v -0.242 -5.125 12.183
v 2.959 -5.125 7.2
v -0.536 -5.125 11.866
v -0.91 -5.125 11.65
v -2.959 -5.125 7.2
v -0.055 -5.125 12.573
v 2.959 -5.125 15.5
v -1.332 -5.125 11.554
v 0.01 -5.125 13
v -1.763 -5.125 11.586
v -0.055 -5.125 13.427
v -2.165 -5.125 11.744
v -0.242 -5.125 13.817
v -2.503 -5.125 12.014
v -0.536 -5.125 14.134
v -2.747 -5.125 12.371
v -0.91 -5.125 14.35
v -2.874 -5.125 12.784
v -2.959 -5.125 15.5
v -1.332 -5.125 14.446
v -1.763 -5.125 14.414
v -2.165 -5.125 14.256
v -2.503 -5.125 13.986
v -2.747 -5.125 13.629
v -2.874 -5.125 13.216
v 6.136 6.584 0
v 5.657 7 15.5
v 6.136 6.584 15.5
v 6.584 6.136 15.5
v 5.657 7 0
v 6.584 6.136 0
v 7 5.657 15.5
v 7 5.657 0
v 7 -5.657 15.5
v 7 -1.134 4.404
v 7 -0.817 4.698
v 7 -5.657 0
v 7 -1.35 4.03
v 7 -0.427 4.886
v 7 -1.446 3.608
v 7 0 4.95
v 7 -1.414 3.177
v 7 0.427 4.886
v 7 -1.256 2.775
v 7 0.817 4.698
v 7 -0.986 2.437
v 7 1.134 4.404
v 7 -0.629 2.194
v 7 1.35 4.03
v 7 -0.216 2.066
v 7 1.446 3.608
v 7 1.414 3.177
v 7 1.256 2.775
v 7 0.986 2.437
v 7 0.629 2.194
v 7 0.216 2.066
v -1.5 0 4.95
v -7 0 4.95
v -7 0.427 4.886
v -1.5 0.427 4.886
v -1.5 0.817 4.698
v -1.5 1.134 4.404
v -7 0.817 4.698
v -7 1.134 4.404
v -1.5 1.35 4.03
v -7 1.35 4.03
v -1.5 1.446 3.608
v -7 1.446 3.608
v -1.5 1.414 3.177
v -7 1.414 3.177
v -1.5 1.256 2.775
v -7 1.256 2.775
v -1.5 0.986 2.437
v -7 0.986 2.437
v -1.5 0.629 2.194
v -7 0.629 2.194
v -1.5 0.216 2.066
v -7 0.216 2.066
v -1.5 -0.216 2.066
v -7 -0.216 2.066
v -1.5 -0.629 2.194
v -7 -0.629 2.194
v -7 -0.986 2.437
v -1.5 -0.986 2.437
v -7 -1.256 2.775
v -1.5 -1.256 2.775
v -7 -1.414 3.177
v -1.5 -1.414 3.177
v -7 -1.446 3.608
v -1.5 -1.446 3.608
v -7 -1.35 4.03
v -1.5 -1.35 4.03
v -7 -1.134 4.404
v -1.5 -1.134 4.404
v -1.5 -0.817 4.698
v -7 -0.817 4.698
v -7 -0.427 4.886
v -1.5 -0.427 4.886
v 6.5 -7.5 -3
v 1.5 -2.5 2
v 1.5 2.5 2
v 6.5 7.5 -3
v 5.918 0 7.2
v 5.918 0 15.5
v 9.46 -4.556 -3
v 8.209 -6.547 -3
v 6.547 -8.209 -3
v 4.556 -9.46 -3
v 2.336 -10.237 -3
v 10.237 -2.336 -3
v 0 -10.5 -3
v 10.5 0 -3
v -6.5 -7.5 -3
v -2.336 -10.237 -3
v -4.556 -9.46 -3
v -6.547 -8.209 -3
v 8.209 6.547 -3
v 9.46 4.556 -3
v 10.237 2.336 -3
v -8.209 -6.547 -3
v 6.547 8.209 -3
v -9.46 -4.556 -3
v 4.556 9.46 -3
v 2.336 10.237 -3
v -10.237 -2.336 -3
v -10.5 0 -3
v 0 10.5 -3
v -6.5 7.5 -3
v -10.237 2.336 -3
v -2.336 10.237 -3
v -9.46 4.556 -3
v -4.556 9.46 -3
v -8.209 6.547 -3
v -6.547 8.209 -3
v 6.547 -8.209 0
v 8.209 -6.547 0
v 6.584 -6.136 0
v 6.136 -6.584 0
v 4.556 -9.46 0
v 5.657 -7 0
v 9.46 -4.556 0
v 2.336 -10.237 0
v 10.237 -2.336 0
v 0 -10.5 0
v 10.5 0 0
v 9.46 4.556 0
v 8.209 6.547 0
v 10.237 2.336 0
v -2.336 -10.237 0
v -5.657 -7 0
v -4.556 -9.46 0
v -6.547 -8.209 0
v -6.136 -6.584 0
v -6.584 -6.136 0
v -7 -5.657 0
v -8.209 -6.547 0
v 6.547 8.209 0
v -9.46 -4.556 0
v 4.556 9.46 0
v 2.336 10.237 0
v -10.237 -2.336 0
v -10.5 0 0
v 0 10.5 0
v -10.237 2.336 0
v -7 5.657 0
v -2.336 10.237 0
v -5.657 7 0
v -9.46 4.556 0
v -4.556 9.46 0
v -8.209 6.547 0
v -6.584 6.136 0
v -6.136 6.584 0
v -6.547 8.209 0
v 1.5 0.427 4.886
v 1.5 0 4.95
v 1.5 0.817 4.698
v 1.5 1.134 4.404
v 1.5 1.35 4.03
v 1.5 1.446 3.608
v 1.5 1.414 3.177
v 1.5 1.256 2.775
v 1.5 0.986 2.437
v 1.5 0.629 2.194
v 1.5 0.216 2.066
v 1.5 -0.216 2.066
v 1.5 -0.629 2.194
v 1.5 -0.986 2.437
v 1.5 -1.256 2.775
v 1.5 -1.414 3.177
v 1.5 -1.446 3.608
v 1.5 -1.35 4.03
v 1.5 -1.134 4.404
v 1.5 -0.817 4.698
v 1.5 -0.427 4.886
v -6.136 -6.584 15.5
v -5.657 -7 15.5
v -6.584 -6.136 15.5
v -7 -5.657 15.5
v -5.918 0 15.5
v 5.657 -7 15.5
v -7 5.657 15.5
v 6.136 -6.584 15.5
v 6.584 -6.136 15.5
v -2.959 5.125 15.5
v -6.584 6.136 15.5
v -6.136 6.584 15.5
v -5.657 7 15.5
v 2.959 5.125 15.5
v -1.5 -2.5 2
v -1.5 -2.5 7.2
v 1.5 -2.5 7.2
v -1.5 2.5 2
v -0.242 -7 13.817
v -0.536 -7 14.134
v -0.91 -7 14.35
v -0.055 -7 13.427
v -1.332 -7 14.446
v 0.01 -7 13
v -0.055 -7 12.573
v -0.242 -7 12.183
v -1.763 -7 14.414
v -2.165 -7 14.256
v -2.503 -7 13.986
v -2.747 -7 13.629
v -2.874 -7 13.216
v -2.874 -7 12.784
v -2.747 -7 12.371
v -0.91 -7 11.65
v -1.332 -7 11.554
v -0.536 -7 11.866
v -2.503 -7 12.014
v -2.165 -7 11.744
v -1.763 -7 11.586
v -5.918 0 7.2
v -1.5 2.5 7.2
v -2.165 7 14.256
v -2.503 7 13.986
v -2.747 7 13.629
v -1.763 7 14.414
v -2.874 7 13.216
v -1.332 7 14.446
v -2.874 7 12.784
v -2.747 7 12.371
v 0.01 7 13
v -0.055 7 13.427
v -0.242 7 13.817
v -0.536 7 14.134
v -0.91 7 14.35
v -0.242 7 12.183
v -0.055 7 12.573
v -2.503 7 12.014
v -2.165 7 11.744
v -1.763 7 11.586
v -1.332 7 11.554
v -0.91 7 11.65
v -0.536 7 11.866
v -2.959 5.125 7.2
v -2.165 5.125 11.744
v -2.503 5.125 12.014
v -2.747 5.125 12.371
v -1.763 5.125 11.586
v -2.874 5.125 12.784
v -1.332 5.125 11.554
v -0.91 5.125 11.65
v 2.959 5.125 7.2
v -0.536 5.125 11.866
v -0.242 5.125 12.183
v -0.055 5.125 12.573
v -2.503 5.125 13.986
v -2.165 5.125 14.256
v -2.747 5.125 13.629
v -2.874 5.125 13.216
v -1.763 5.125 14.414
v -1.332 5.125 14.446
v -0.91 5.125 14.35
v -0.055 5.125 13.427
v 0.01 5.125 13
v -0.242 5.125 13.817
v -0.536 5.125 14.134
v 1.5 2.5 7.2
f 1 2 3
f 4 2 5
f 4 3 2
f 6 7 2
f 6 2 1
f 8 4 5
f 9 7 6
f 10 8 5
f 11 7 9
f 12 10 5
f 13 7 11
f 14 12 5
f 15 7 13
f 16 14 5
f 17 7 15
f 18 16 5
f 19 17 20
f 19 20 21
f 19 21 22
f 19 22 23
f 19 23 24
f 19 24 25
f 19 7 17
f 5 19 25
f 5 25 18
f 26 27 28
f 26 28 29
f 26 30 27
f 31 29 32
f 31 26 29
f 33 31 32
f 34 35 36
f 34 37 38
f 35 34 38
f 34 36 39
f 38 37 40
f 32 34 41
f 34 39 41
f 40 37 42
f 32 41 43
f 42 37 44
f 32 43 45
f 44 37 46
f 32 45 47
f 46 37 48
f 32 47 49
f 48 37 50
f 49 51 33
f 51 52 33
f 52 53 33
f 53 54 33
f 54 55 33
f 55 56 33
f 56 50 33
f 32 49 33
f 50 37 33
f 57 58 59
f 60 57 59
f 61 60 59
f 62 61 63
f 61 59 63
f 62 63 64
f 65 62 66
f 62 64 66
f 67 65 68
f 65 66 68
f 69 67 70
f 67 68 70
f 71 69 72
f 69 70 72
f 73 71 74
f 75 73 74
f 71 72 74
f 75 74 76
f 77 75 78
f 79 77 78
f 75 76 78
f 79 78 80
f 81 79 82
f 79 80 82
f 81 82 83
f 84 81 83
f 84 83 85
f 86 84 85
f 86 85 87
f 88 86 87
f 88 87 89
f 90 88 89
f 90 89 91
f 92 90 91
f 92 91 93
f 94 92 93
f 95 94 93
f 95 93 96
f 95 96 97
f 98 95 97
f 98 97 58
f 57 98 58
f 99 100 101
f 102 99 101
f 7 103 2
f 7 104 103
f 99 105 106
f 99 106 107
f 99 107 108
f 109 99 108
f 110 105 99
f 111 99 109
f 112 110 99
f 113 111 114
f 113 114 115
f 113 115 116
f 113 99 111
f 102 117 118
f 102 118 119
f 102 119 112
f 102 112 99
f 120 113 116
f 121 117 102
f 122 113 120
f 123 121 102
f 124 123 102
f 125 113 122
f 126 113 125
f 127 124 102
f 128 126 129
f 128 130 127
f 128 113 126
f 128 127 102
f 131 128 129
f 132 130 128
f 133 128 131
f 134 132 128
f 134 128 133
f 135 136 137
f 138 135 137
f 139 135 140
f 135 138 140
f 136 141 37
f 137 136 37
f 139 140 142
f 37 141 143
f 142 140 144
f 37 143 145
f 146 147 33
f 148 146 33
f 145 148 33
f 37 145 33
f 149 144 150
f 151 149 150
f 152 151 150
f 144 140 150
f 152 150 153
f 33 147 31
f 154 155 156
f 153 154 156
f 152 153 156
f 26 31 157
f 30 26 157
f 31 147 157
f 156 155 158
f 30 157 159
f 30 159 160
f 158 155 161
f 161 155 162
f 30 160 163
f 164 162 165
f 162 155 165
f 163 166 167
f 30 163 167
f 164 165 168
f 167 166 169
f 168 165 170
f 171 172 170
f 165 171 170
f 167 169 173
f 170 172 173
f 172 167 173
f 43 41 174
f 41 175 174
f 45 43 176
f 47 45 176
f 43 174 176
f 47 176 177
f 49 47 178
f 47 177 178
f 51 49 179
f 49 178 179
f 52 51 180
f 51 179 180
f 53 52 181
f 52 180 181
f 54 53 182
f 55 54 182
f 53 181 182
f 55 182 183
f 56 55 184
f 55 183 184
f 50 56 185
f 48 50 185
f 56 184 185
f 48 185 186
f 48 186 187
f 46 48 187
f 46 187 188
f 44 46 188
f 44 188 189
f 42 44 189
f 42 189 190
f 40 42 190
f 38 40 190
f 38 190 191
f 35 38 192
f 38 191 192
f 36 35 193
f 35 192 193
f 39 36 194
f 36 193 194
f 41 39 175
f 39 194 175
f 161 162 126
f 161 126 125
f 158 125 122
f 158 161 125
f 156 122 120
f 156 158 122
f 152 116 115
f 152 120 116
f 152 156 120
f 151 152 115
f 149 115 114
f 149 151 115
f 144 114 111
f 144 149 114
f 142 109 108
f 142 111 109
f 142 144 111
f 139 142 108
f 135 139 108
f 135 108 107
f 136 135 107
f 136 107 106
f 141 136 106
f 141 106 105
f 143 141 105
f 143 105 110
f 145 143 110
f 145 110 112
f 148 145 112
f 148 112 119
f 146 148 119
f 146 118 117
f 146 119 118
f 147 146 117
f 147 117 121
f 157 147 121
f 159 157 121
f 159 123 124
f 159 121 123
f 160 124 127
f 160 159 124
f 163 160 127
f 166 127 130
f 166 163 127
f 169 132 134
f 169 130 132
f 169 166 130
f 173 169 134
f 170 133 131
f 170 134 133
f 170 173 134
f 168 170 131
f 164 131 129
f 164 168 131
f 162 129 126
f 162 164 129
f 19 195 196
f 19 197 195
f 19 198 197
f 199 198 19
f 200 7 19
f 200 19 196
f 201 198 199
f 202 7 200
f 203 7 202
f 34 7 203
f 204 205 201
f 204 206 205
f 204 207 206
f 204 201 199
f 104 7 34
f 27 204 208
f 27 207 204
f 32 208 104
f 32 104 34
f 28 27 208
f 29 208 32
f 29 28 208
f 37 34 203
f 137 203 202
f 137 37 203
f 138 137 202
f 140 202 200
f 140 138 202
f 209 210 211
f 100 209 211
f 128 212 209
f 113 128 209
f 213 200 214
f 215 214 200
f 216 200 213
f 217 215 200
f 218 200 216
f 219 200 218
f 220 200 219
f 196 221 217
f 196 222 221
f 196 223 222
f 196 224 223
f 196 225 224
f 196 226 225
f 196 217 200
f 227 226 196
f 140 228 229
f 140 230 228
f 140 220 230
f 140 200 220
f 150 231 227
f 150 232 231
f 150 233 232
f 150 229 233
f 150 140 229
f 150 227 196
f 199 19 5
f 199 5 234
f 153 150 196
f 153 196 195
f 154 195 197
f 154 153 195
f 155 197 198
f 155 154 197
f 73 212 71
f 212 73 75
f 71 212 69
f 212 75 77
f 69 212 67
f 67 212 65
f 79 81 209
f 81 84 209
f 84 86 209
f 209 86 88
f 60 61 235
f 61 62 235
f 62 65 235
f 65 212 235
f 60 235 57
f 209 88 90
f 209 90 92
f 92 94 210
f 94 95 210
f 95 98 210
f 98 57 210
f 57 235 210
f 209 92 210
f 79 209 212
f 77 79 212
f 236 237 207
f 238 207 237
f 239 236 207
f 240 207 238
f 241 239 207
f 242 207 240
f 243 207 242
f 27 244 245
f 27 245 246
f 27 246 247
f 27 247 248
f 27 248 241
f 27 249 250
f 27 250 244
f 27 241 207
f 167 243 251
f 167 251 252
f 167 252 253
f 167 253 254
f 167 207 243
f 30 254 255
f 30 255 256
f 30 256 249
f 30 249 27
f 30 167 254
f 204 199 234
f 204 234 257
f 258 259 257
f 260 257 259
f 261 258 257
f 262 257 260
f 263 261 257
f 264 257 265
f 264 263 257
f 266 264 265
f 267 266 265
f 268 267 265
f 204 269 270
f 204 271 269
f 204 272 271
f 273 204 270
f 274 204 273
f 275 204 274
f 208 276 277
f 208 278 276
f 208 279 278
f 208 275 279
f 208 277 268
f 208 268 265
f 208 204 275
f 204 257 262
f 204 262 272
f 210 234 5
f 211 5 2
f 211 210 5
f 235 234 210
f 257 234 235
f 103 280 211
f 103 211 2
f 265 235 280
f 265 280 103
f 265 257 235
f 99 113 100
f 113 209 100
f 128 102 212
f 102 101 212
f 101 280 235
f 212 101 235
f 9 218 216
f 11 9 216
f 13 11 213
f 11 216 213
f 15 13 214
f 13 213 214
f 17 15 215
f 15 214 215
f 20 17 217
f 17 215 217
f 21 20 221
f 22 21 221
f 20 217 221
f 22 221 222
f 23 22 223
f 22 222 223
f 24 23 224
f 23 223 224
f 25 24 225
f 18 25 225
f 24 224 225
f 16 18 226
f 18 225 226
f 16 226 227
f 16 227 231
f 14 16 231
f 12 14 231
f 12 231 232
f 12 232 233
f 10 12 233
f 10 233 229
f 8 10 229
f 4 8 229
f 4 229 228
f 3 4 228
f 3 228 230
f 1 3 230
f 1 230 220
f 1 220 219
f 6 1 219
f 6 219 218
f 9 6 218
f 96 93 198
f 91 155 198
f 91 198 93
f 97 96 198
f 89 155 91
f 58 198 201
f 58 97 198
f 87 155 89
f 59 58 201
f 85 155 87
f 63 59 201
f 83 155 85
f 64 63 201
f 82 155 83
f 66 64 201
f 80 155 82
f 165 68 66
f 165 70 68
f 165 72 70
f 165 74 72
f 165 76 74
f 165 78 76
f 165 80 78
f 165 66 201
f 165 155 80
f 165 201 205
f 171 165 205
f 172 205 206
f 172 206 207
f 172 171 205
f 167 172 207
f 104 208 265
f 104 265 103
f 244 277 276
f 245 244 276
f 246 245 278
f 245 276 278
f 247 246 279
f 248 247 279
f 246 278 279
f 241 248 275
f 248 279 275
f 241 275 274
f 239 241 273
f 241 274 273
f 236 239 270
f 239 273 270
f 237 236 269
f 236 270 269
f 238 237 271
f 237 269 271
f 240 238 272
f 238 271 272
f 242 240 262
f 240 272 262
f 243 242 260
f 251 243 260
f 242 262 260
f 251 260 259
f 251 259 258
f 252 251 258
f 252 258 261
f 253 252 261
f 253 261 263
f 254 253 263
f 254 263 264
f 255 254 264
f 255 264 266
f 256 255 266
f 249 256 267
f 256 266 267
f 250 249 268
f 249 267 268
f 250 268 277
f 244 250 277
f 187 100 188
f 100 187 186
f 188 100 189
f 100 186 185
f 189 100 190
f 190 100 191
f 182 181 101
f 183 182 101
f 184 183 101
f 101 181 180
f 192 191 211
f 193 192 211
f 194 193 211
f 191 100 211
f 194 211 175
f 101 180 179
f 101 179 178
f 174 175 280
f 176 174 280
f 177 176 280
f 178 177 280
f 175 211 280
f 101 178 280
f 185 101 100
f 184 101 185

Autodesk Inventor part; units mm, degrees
ref_plane "YZ Plane" through (0, 0, 0) normal (1, 0, 0) x (0, 1, 0)
ref_plane "XZ Plane" through (0, 0, 0) normal (0, 1, 0) x (-1, 0, 0)
ref_plane "XY Plane" through (0, 0, 0) normal (0, 0, 1) x (1, 0, 0)
sketch "Sketch1" plane through (0, 0, 0) normal (0, 0, 1) x (1, 0, 0)
  circle A0 centre (0, 0) radius 9
  line L0 (-0.75, 10) -> (0.75, 10)
  line L1 (0.75, 10) -> (0.75, 0)
  line L2 (0.75, 0) -> (-0.75, 0)
  line L3 (-0.75, 0) -> (-0.75, 10)
  point P0 (-0.75, 8.9687)
  point P1 (0.75, 8.9687)
  dimension "d0" = 18
  dimension "d26" = 0.75
  dimension "d28" = 0
  dimension "d29" = 10
extrude "Extrusion1" add sketch "Sketch1" along normal blind 15.5 contours A0 L3 L2 L1 | L1 L2 L3 A0
sketch "Sketch2" plane through (0, 0, 0) normal (0, 0, -1) x (-1, 0, 0)
  line L0 (-1.5, -2.5) -> (1.5, -2.5)
  line L1 (1.5, -2.5) -> (1.5, 2.5)
  line L2 (1.5, 2.5) -> (-1.5, 2.5)
  line L3 (-1.5, 2.5) -> (-1.5, -2.5)
  point P0 (0, 0)
  dimension "d3" = 3
  dimension "d4" = 5
  dimension "d5" = 2.5
  dimension "d6" = 1.5
extrude "Extrusion2" cut sketch "Sketch2" against normal blind 10
sketch "Sketch3" plane through (0, 0, 15.5) normal (0, 0, 1) x (1, 0, 0)
  circle A0 centre (0, 0) radius 1.6
  dimension "d9" = 3.2
extrude "Extrusion3" [suppressed]
sketch "Sketch4" plane through (0, 0, 0) normal (0, 0, -1) x (-1, 0, 0)
  circle A0 centre (0, 0) radius 4.5
  dimension "d12" = 9
extrude "Extrusion4" [suppressed]
sketch "Sketch10" plane through (0, 0, 15.5) normal (0, 0, 1) x (1, 0, 0)
  line L0 (2.9589, 5.125) -> (5.9178, 0)
  line L1 (5.9178, 0) -> (2.9589, -5.125)
  line L2 (2.9589, -5.125) -> (-2.9589, -5.125)
  line L3 (-2.9589, -5.125) -> (-5.9178, 0)
  line L4 (-5.9178, 0) -> (-2.9589, 5.125)
  line L5 (-2.9589, 5.125) -> (2.9589, 5.125)
  point P0 (0, 0)
  point P1 (0, 0)
  dimension "d145" = 10.25
extrude "Extrusion7" cut sketch "Sketch10" against normal blind 8.3
ref_plane "Work Plane3" through (0, -9, 0) normal (0, -1, 0) x (1, 0, 0)
sketch "Sketch11" plane through (0, -9, 0) normal (0, -1, 0) x (1, 0, 0)
  circle A0 centre (-1.4401, 13) radius 1.45
  line L0 (9, 15.5) -> (-9, 15.5) projected
  point P0 (0, 0)
  dimension "d66" = 2.9
  dimension "d144" = 2.5
extrude "Extrusion8" cut sketch "Sketch11" against normal through all both and the other way through all
ref_plane "Work Plane4" through (-10.5, -2.5, 0) normal (-1, 0, 0) x (0, 0, 1)
sketch "Sketch12" plane through (-10.5, -2.5, 0) normal (-1, 0, 0) x (0, 0, 1)
  circle A0 centre (3.5, 2.5) radius 1.45
  point P0 (0, 2.5)
  dimension "d71" = 2.9
  dimension "d74" = 3.5
extrude "Extrusion9" cut sketch "Sketch12" against normal blind 22
sketch "Sketch13" plane through (0, 0, 0) normal (0, 0, -1) x (-1, 0, 0)
  circle A0 centre (0, 0) radius 9.25
  circle A1 centre (0, 0) radius 4.75
  dimension "d75" = 9.5
  dimension "d78" = 18.5
extrude "Extrusion10" [suppressed]
sketch "Sketch14" plane through (0, 0, -3.7) normal (0, 0, -1) x (-1, 0, 0)
  line L0 (-8, -5) -> (-10, -5)
  line L1 (-10, -5) -> (-10, 5)
  line L2 (-10, 5) -> (-8, 5)
  line L3 (-8, 5) -> (-8, -5)
  line L4 (10, -5) -> (8, -5)
  line L5 (8, -5) -> (8, 5)
  line L6 (8, 5) -> (10, 5)
  line L7 (10, 5) -> (10, -5)
  line L8 (8, 8) -> (-8, 8)
  line L9 (-8, 8) -> (-8, 10)
  line L10 (-8, 10) -> (8, 10)
  line L11 (8, 10) -> (8, 8)
  line L12 (8, -10) -> (-5, -10)
  line L13 (-5, -10) -> (-5, -8)
  line L14 (-5, -8) -> (8, -8)
  line L15 (8, -8) -> (8, -10)
  point P0 (0, 0)
  dimension "d79" = 8
  dimension "d80" = 2
  dimension "d81" = 5
  dimension "d82" = 5
  dimension "d83" = 8
  dimension "d84" = 2
  dimension "d85" = 5
  dimension "d86" = 5
  dimension "d89" = 8
  dimension "d90" = 8
  dimension "d91" = 2
  dimension "d92" = 2
  dimension "d93" = 8
  dimension "d94" = 8
  dimension "d95" = 8
  dimension "d96" = 5
extrude "Extrusion11" [suppressed]
sketch "Sketch15" plane through (0, 0, 0) normal (0, 0, -1) x (-1, 0, 0)
  line L0 (10, -10.5) -> (7, -10.5)
  line L1 (7, -10.5) -> (7, 10.5)
  line L2 (7, 10.5) -> (10, 10.5)
  line L3 (10, 10.5) -> (10, -10.5)
  line L4 (-10, -10.5) -> (-7, -10.5)
  line L5 (-7, -10.5) -> (-7, 10.5)
  line L6 (-7, 10.5) -> (-10, 10.5)
  line L7 (-10, 10.5) -> (-10, -10.5)
  line L8 (-9.5, 10.5) -> (9.5, 10.5)
  line L9 (9.5, 10.5) -> (9.5, 7)
  line L10 (9.5, 7) -> (-9.5, 7)
  line L11 (-9.5, 7) -> (-9.5, 10.5)
  line L12 (-1.5, 2.5) -> (1.5, 2.5) projected
  line L13 (-1.5, -2.5) -> (-1.5, 2.5) projected
  line L14 (1.5, 2.5) -> (1.5, -2.5) projected
  line L15 (1.5, -2.5) -> (-1.5, -2.5) projected
  line L16 (-9.5, -7) -> (9.5, -7)
  line L17 (9.5, -7) -> (9.5, -10.5)
  line L18 (9.5, -10.5) -> (-9.5, -10.5)
  line L19 (-9.5, -10.5) -> (-9.5, -7)
  point P0 (0, 0)
  point P1 (-7, 7)
  point P2 (7, 7)
  point P3 (7, -7)
  point P4 (-7, -7)
  dimension "d101" = 8
  dimension "d102" = 8
  dimension "d103" = 8
  dimension "d106" = 8
  dimension "d107" = 8
  dimension "d109" = 8
  dimension "d110" = 8
  dimension "d111" = 8
  dimension "d113" = 8
  dimension "d114" = 8
  dimension "d115" = 3
  dimension "d118" = 7
  dimension "d119" = 7
  dimension "d120" = 7
  dimension "d121" = 7
  dimension "d146" = 3
extrude "Extrusion12" cut sketch "Sketch15" against normal blind 16.25 contours L0 L17 L16 L1 L10 L9 L2 L3 | L0 L1 L16 L17 | L18 L5 L16 L1 | L9 L10 L1 L2 | L4 L19 L16 L5 | L1 L10 L5 L8 | L16 L19 L4 L7 L6 L11 L10 L5 | L5 L10 L11 L6
sketch "Sketch17" plane through (0, 0, 0) normal (0, 0, -1) x (-1, 0, 0)
  line L0 (4.5, 4.5) -> (7, 4.5)
  line L1 (7, 4.5) -> (7, 7)
  line L2 (7, 7) -> (4.5, 7)
  line L3 (4.5, 7) -> (4.5, 4.5)
  line L4 (5.6569, 7) -> (-5.6569, 7) projected
  line L5 (7, -5.6569) -> (7, 5.6569) projected
  line L6 (7, -7) -> (4.5, -7)
  line L7 (4.5, -7) -> (4.5, -4.5)
  line L8 (4.5, -4.5) -> (7, -4.5)
  line L9 (7, -4.5) -> (7, -7)
  line L10 (-7, -7) -> (-4.5, -7)
  line L11 (-4.5, -7) -> (-4.5, -4.5)
  line L12 (-4.5, -4.5) -> (-7, -4.5)
  line L13 (-7, -4.5) -> (-7, -7)
  line L14 (-4.5, 7) -> (-7, 7)
  line L15 (-7, 7) -> (-7, 4.5)
  line L16 (-7, 4.5) -> (-4.5, 4.5)
  line L17 (-4.5, 4.5) -> (-4.5, 7)
  line L18 (-5.6569, -7) -> (5.6569, -7) projected
  line L19 (-7, 5.6569) -> (-7, -5.6569) projected
  point P0 (0, 0)
  point P1 (7, -4.5)
  point P2 (-4.5, 7)
  dimension "d128" = 2.5
  dimension "d129" = 2.5
  dimension "d130" = 2.5
  dimension "d131" = 2.5
  dimension "d132" = 2.5
  dimension "d133" = 2.5
  dimension "d134" = 2.5
  dimension "d135" = 2.5
extrude "Extrusion14" [suppressed]
sketch "Sketch18" plane through (0, 0, 0) normal (0, 0, -1) x (-1, 0, 0)
  circle A0 centre (0, 0) radius 10.5
  line L0 (-1.5, -2.5) -> (-1.5, 2.5) projected
  line L1 (1.5, 2.5) -> (1.5, -2.5) projected
  line L2 (-1.5, 2.5) -> (1.5, 2.5)
  line L3 (1.5, 2.5) -> (1.5, -2.5)
  line L4 (1.5, -2.5) -> (-1.5, -2.5)
  line L5 (-1.5, -2.5) -> (-1.5, 2.5)
  dimension "d138" = 21
extrude "Extrusion15" add sketch "Sketch18" along normal blind 3
chamfer "Chamfer1" distance 5 angle 45 4 edges at (-1.5, 0, -3) (1.5, 0, -3) (0, 2.5, -3) (0, -2.5, -3)
equation "\"d5\" = 0.5 * d4"
equation "\"d6\" = 0.5 * d3"
equation "\"d79\" = d83"
equation "\"d84\" = d80"
equation "\"d89\" = d79"
equation "\"d90\" = d79"
equation "\"d91\" = d80"
equation "\"d92\" = d80"
equation "\"d119\" = d118"
equation "\"d120\" = d118"
equation "\"d121\" = d118"
equation "\"d128\" = d129"
equation "\"d130\" = d129"
equation "\"d131\" = d129"
equation "\"d132\" = d129"
equation "\"d133\" = d129"
equation "\"d134\" = d129"
equation "\"d135\" = d129"
properties part number "6mm_shaft_couple_sideclip_v2"
